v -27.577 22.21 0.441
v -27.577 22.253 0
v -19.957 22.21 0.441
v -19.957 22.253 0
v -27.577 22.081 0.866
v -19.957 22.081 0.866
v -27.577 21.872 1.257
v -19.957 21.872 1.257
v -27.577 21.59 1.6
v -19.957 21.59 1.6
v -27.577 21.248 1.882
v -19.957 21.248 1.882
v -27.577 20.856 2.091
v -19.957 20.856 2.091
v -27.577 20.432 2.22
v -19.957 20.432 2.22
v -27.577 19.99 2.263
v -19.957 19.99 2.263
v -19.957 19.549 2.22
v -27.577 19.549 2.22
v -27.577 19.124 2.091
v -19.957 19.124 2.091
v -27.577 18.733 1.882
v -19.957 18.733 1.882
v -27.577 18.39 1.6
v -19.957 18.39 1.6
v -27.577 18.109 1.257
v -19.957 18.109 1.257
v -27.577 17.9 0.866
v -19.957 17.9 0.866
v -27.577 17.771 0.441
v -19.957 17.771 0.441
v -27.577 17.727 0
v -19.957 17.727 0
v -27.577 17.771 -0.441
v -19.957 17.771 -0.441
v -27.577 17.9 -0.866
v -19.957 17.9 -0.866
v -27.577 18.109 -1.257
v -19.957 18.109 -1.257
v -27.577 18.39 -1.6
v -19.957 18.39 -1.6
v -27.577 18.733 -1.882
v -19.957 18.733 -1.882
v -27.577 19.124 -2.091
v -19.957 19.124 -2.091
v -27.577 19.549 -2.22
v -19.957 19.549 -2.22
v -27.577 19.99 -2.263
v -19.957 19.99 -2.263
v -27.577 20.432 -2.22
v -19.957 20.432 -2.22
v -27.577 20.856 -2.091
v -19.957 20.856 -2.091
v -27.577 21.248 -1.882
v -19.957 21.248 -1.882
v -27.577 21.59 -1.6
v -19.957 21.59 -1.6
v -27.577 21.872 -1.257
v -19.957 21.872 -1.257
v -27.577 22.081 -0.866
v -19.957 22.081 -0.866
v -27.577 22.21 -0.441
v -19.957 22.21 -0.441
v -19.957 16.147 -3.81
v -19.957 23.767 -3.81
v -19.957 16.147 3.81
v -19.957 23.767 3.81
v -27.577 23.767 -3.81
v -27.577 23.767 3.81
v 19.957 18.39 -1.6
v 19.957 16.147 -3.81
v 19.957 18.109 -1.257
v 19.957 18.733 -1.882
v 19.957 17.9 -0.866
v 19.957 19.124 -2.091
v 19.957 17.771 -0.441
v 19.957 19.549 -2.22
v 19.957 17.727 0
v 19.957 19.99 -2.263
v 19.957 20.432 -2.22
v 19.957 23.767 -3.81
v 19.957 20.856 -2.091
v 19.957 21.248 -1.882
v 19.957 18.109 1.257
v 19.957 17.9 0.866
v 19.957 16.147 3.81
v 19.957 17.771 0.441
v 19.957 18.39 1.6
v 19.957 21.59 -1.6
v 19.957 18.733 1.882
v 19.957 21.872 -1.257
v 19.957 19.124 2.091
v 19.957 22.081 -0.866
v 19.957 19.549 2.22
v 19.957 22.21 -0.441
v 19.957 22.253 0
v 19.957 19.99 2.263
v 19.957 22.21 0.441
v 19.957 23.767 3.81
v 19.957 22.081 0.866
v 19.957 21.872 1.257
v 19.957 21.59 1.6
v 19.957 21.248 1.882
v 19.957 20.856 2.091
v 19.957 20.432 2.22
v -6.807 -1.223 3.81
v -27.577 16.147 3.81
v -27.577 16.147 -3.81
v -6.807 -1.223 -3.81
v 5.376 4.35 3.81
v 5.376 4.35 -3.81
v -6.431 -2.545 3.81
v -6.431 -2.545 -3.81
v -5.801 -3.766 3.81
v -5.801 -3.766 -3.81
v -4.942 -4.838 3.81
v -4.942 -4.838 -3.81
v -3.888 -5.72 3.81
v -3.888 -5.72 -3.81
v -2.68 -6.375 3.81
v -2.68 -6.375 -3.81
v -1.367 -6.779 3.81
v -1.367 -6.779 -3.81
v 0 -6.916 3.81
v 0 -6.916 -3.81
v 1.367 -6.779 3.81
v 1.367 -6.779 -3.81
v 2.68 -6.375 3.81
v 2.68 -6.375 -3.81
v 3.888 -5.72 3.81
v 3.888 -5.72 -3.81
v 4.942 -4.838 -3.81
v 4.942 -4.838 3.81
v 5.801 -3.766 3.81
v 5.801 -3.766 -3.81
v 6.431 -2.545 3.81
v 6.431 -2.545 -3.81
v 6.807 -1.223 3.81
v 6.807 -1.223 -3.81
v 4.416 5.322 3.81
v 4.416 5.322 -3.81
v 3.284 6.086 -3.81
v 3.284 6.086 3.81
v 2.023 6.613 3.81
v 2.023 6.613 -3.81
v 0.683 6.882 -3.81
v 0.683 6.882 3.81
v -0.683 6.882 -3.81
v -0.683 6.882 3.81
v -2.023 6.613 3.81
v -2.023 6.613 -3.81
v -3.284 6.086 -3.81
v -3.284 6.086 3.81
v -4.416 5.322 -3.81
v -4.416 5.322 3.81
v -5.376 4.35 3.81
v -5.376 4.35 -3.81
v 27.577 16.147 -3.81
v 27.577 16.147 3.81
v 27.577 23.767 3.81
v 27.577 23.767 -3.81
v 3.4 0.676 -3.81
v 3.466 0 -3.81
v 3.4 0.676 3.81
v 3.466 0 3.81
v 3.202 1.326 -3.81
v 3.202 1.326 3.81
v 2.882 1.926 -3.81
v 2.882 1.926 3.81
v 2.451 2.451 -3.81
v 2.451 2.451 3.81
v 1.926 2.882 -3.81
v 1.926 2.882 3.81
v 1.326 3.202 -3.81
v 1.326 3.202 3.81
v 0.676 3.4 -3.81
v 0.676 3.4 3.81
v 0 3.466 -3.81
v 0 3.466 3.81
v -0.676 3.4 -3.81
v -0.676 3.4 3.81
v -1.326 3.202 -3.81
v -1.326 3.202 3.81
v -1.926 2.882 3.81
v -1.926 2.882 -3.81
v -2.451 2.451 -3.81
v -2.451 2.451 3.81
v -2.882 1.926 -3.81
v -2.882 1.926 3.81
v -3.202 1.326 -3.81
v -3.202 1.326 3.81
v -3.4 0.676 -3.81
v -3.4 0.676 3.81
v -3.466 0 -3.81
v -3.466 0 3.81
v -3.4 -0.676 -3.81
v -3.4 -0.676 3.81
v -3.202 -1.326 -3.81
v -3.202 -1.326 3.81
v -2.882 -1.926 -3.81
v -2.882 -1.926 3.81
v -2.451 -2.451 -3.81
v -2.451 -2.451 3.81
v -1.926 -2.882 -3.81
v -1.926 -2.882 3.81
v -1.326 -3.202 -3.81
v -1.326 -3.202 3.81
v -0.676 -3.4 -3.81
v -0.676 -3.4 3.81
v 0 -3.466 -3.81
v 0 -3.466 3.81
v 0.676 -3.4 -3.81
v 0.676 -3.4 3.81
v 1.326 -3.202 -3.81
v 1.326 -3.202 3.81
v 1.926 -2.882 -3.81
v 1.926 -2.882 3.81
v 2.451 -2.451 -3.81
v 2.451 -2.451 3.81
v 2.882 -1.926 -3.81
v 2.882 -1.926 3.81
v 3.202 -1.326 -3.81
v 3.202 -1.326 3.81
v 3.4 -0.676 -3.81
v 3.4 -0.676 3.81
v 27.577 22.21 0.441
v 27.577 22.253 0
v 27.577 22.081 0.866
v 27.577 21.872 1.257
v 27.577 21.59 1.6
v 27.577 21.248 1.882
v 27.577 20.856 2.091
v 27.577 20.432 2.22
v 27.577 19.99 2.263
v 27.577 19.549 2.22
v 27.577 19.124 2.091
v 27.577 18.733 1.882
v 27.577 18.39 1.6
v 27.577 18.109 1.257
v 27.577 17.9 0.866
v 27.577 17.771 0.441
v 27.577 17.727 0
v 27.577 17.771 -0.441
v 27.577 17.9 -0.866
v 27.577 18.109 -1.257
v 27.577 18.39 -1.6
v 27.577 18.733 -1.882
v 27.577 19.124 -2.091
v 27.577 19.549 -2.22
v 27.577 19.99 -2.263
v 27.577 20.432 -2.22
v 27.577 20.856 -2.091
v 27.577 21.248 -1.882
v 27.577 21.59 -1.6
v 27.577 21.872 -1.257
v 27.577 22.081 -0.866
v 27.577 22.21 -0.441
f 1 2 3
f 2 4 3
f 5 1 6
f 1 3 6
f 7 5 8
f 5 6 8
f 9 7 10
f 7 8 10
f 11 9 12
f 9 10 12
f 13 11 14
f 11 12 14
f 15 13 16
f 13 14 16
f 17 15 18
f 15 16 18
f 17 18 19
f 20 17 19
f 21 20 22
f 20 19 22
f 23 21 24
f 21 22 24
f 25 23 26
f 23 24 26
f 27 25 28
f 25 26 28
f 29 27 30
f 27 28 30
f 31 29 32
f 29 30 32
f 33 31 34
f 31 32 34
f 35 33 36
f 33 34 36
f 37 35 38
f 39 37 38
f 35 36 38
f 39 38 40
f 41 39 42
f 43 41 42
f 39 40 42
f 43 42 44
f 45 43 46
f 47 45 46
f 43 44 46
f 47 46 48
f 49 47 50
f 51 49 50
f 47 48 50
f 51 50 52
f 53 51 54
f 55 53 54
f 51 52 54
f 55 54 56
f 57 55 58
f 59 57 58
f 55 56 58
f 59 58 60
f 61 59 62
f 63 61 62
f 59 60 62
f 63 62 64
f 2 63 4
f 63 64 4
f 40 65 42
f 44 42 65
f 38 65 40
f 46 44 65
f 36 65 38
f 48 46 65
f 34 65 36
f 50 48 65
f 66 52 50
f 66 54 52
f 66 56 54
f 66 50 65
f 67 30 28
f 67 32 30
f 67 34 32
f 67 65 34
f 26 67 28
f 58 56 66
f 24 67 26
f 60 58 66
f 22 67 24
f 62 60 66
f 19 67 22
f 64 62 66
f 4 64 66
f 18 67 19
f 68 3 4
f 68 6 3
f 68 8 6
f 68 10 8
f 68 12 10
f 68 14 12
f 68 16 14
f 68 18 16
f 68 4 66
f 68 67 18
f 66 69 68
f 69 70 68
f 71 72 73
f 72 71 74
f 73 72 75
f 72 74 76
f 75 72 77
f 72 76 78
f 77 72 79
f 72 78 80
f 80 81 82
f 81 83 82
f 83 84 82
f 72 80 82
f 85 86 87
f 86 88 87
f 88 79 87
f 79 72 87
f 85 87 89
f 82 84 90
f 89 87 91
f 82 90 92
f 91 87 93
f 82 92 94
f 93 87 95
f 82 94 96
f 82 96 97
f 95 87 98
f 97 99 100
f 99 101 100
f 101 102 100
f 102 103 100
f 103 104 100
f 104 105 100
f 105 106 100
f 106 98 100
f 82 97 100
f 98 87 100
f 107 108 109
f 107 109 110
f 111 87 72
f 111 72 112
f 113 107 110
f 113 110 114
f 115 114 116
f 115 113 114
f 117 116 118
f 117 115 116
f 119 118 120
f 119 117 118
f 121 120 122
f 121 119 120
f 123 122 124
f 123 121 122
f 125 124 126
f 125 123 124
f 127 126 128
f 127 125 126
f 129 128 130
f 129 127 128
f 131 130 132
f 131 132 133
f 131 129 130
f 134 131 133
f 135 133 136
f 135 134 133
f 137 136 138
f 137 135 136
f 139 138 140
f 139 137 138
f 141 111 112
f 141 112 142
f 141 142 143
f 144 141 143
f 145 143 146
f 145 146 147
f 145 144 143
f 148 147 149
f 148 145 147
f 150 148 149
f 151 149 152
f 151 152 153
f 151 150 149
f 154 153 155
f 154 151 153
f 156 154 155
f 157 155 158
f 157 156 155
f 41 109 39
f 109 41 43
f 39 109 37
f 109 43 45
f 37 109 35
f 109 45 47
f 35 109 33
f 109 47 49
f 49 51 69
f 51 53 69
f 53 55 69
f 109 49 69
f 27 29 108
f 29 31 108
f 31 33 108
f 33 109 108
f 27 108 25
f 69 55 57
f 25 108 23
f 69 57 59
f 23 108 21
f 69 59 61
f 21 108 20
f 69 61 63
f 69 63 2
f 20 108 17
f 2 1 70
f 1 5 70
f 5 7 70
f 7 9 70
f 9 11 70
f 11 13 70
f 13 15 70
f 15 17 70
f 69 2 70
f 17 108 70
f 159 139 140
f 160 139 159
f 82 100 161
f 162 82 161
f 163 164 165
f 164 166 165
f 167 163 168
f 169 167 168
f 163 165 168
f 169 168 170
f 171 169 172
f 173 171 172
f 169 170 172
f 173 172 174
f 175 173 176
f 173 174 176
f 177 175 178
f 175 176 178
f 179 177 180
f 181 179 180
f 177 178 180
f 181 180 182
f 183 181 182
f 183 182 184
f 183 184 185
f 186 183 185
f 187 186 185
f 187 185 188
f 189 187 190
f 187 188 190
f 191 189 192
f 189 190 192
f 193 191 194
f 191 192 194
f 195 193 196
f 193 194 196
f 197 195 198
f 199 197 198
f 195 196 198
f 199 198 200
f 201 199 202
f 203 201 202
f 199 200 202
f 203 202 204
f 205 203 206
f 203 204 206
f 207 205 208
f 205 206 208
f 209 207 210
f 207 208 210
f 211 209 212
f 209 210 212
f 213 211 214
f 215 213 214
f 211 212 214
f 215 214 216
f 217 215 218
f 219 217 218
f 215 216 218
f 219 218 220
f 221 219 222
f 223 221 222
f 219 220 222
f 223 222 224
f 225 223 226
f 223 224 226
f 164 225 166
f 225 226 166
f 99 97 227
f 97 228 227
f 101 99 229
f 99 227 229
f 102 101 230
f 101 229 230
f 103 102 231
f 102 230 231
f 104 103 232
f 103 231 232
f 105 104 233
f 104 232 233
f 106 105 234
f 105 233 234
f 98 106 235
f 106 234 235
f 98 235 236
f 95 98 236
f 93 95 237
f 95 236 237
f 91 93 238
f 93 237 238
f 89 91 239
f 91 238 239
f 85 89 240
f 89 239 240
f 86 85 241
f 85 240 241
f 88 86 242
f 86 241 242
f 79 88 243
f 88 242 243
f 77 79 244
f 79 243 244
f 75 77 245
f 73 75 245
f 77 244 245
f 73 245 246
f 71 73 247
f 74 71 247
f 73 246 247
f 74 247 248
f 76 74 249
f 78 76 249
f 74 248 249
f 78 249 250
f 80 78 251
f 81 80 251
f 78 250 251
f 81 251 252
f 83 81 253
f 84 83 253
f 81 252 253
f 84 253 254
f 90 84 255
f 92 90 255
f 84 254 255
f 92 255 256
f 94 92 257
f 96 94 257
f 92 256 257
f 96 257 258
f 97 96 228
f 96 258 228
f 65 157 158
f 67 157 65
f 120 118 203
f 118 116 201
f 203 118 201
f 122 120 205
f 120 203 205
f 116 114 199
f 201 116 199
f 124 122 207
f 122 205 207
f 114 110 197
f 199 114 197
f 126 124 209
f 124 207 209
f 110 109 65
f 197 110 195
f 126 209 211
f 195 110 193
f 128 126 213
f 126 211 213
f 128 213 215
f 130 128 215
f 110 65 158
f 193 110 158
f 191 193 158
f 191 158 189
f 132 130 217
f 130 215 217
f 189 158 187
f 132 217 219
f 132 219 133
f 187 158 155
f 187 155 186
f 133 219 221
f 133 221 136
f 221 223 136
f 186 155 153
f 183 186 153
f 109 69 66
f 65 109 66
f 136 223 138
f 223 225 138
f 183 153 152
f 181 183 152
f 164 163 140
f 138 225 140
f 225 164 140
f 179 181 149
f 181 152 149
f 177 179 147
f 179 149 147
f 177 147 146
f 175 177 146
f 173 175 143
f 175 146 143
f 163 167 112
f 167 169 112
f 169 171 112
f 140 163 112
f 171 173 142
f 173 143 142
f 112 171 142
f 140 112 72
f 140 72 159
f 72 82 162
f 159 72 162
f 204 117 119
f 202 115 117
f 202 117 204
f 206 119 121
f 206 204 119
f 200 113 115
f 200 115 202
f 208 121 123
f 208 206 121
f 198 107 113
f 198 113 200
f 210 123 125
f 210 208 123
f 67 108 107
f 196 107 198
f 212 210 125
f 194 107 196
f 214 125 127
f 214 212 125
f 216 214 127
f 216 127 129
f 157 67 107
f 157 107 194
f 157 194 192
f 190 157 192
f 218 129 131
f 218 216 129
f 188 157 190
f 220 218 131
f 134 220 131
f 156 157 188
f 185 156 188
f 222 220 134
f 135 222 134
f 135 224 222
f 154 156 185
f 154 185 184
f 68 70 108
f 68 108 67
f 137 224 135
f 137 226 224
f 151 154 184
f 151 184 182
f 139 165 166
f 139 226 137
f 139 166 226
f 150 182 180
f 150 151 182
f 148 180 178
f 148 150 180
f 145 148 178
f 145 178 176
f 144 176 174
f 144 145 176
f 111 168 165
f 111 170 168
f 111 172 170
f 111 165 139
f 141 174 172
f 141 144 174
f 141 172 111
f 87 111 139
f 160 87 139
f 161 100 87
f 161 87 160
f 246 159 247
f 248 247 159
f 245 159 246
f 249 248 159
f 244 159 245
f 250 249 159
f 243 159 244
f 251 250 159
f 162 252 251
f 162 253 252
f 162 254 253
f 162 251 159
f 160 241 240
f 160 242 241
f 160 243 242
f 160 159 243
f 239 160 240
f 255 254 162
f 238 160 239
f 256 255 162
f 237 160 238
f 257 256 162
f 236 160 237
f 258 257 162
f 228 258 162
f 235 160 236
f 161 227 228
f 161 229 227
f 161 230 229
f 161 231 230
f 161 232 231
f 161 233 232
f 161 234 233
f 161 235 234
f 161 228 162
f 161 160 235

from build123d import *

# Parameters (mm, degrees)
F0_W     = 7.6200012118
F0_H     = 7.6199993491
F1_DEPTH = 3.81
F2_R     = 2.2630247345
F3_DEPTH = 28.702
F4_R     = 3.4661876641
F5_DEPTH = 6.096


with BuildPart() as f1:
    # F0 (on Top) → F1 (new body, symmetric)
    with BuildSketch(Plane.XY):
        with Locations((-23.7671425566, 19.9571419507)):
            Rectangle(F0_W, F0_H)
        with Locations((23.7671425566, 19.9571419507)):
            Rectangle(F0_W, F0_H)
        with BuildLine():
            ThreePointArc((-6.8066905284, -1.2232744461), (-6.6986512028, 1.719159208), (-5.3763601299, 4.3499641462))
            Line((-5.3763601299, 4.3499641462), (-19.9571419507, 16.1471422762))
            Line((-19.9571419507, 16.1471422762), (-27.5771431625, 16.1471422762))
            Line((-27.5771431625, 16.1471422762), (-6.8066905284, -1.2232744461))
        make_face()
        with BuildLine():
            ThreePointArc((5.3763601299, 4.3499641462), (6.5195450768, 2.3071558921), (6.9157383062, 0))
            ThreePointArc((6.9157383062, 0), (6.8884224154, -0.6140626573), (6.8066905284, -1.2232744461))
            Line((6.8066905284, -1.2232744461), (27.5771431625, 16.1471422762))
            Line((27.5771431625, 16.1471422762), (19.9571419507, 16.1471422762))
            Line((19.9571419507, 16.1471422762), (5.3763601299, 4.3499641462))
        make_face()
        with BuildLine():
            Line((0, 0), (5.3763601299, 4.3499641462))
            ThreePointArc((5.3763601299, 4.3499641462), (0, 6.9157383062), (-5.3763601299, 4.3499641462))
            Line((-5.3763601299, 4.3499641462), (0, 0))
        make_face()
        with BuildLine():
            ThreePointArc((0, -6.9157383062), (4.4366423325, -5.3050580706), (6.8066905284, -1.2232744461))
            Line((6.8066905284, -1.2232744461), (0, -6.9157383062))
        make_face()
        with BuildLine():
            ThreePointArc((-6.8066905284, -1.2232744461), (-4.4366423325, -5.3050580706), (0, -6.9157383062))
            Line((0, -6.9157383062), (-6.8066905284, -1.2232744461))
        make_face()
        with BuildLine():
            ThreePointArc((6.8066905284, -1.2232744461), (6.8884224154, -0.6140626573), (6.9157383062, 0))
            ThreePointArc((6.9157383062, 0), (6.5195450768, 2.3071558921), (5.3763601299, 4.3499641462))
            Line((5.3763601299, 4.3499641462), (0, 0))
            Line((0, 0), (-5.3763601299, 4.3499641462))
            ThreePointArc((-5.3763601299, 4.3499641462), (-6.6986512028, 1.719159208), (-6.8066905284, -1.2232744461))
            Line((-6.8066905284, -1.2232744461), (0, -6.9157383062))
            Line((0, -6.9157383062), (6.8066905284, -1.2232744461))
        make_face()
    extrude(amount=F1_DEPTH, both=True)

    # F2 (on Right) → F3 (cut, symmetric)
    with BuildSketch(Plane.YZ):
        with Locations((19.9902858585, 0)):
            Circle(F2_R)
    extrude(amount=F3_DEPTH, both=True, mode=Mode.SUBTRACT)

    # F4 (on Top) → F5 (cut, symmetric)
    with BuildSketch(Plane.XY):
        Circle(F4_R)
    extrude(amount=F5_DEPTH, both=True, mode=Mode.SUBTRACT)


solid = f1.part
